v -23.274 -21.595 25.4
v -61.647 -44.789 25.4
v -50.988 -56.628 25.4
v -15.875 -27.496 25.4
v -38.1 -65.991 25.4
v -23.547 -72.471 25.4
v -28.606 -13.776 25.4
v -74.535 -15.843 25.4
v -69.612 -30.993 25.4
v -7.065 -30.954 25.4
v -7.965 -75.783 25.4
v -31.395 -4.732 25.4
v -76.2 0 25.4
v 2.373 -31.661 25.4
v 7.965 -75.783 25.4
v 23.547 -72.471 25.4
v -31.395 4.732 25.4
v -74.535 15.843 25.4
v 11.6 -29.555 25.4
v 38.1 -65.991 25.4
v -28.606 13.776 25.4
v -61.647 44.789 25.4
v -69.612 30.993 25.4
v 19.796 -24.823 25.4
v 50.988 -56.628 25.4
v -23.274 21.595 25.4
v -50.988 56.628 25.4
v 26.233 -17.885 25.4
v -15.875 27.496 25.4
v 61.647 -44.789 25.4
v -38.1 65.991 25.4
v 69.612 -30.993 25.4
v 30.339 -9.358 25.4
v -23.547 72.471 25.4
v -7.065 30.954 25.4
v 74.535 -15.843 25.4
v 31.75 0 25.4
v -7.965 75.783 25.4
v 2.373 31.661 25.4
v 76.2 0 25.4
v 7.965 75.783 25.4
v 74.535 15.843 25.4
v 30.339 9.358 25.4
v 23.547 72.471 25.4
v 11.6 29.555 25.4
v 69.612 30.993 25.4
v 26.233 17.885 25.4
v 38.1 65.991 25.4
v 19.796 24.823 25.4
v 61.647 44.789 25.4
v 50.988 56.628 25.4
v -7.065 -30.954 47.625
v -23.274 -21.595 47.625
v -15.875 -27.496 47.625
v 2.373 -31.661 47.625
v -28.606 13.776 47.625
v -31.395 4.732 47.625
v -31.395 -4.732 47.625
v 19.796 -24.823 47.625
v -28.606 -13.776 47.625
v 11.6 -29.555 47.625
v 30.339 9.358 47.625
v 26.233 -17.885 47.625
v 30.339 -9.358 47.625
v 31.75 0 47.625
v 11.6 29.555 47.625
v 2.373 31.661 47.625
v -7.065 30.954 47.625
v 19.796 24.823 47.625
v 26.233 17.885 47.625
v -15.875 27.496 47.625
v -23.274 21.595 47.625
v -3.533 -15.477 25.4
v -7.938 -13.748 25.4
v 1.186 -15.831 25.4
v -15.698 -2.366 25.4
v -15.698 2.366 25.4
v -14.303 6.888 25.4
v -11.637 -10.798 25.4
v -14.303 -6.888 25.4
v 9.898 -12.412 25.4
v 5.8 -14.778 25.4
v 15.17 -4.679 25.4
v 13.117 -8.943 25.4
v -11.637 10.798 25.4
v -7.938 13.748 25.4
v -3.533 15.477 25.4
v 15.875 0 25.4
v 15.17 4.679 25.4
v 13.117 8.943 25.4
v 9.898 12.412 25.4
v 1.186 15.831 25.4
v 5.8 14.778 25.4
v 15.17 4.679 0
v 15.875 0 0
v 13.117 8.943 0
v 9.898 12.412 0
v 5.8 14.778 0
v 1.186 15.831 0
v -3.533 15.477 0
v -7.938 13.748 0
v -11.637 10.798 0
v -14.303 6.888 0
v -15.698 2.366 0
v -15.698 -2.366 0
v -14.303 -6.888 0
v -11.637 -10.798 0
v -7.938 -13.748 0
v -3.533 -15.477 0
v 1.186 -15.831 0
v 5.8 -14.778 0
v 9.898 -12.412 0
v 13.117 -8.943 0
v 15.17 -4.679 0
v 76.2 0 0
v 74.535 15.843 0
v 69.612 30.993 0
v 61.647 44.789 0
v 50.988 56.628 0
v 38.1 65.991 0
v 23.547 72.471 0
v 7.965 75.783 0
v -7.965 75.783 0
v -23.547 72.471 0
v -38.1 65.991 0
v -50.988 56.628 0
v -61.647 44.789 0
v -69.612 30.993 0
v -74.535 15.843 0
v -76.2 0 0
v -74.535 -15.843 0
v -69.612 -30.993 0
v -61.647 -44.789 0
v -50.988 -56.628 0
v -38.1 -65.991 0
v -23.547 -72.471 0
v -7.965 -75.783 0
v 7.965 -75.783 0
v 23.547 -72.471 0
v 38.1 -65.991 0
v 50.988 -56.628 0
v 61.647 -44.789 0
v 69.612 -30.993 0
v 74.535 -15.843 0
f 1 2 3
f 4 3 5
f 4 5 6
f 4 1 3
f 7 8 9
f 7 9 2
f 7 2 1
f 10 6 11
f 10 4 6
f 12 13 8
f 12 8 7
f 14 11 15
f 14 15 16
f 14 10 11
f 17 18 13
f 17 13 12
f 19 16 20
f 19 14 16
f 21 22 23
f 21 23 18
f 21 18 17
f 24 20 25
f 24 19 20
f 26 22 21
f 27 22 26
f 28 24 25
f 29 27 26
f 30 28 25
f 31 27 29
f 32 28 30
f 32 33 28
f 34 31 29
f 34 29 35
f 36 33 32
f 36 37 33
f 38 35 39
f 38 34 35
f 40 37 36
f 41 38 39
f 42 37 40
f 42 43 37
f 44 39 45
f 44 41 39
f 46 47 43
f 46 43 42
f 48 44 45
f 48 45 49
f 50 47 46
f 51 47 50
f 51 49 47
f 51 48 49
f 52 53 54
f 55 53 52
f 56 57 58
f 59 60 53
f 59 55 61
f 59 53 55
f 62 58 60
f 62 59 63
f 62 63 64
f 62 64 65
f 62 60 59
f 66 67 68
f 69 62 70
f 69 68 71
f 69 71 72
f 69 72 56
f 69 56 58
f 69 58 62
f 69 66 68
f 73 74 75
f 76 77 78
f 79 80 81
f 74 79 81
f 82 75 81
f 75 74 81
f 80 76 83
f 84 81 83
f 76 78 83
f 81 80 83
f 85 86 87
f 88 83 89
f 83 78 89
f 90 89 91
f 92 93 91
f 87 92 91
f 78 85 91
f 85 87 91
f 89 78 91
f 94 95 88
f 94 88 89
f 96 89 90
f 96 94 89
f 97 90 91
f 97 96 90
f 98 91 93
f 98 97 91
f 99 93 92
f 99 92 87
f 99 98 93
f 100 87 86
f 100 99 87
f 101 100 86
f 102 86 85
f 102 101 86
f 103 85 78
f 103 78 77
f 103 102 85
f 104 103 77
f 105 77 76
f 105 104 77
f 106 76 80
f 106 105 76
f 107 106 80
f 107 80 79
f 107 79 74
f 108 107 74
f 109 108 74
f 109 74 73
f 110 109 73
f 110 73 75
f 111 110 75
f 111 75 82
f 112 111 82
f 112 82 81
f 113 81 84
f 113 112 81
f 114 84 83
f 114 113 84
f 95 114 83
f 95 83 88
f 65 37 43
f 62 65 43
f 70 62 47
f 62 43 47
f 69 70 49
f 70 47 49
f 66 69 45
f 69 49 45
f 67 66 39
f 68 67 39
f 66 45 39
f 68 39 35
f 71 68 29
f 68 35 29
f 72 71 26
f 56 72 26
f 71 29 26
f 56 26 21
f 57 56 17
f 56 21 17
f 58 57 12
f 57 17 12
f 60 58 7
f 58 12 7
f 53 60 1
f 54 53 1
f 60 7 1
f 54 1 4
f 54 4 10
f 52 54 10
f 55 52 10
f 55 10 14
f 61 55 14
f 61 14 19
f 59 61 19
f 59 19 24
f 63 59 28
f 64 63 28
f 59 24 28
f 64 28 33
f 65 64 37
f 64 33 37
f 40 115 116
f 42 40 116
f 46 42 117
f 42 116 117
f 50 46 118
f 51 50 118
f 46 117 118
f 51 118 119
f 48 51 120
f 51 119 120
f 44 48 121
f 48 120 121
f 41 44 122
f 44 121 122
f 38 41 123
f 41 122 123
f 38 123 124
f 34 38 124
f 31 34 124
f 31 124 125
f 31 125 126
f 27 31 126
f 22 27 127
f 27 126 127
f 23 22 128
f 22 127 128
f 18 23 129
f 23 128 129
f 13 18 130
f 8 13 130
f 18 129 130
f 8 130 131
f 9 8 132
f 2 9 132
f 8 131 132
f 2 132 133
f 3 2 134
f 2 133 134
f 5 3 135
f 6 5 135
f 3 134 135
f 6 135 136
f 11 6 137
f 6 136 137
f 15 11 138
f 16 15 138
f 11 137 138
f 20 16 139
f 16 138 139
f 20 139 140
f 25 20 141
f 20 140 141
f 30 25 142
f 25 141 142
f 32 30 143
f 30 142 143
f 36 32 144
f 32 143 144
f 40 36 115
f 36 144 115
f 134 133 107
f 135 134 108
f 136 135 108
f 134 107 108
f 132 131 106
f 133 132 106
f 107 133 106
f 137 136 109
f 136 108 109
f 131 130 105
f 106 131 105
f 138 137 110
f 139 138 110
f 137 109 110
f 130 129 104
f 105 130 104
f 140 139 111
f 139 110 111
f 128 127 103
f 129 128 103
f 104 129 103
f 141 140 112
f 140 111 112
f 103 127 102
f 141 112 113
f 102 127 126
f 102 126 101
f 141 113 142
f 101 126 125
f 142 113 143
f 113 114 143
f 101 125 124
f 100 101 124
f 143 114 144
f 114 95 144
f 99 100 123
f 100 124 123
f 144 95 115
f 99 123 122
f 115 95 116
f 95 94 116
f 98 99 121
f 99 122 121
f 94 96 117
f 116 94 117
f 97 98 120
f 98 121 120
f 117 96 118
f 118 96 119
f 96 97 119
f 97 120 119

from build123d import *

# Parameters (mm, degrees)
SKETCH1_R           = 76.2
SKETCH1_R_2         = 15.875
BOSS_EXTRUDE1_DEPTH = 25.4
SKETCH2_R           = 31.75
BOSS_EXTRUDE2_DEPTH = 22.225


with BuildPart() as part:
    # Sketch1 → Boss-Extrude1 (new body)
    with BuildSketch(Plane.XY):
        Circle(SKETCH1_R)
        Circle(SKETCH1_R_2, mode=Mode.SUBTRACT)
    extrude(amount=BOSS_EXTRUDE1_DEPTH)

    # Sketch2 → Boss-Extrude2 (add)
    with BuildSketch(Plane.XY.offset(25.4)):
        Circle(SKETCH2_R)
    extrude(amount=BOSS_EXTRUDE2_DEPTH)


solid = part.part
